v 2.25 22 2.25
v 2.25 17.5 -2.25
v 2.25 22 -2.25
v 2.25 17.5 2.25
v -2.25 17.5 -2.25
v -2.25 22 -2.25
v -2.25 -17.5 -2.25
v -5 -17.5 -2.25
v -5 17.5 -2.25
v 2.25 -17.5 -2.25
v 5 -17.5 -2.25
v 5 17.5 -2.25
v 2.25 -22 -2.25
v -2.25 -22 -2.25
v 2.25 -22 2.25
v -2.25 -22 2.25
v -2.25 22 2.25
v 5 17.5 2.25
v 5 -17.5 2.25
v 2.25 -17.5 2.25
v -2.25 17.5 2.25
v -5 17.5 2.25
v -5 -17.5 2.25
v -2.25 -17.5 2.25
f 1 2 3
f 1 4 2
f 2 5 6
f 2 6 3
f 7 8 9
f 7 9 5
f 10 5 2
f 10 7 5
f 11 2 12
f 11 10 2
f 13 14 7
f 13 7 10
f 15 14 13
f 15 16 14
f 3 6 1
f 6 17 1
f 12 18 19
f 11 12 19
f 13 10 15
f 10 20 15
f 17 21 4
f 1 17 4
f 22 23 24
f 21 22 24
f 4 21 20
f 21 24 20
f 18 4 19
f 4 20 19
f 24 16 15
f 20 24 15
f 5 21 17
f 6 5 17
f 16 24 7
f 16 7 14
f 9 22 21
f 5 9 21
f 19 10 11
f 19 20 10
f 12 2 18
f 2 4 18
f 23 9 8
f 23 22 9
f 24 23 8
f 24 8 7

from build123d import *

# Parameters (mm, degrees)
SKETCH2_W           = 4.5
SKETCH2_H           = 4.5
SKETCH2_W_2         = 10
SKETCH2_H_2         = 17.5
BOSS_EXTRUDE1_DEPTH = 2.25


with BuildPart() as part:
    # Sketch2 → Boss-Extrude1 (new body, symmetric)
    with BuildSketch(Plane.XY):
        with Locations((0, 19.75)):
            Rectangle(SKETCH2_W, SKETCH2_H)
        with Locations((0, 8.75)):
            Rectangle(SKETCH2_W_2, SKETCH2_H_2)
    extrude(amount=BOSS_EXTRUDE1_DEPTH, both=True)

    # Mirror1: part across plane


with BuildPart() as part_1:
    add(part.part)
    add(part.part.mirror(Plane.ZX))


solid = part_1.part
